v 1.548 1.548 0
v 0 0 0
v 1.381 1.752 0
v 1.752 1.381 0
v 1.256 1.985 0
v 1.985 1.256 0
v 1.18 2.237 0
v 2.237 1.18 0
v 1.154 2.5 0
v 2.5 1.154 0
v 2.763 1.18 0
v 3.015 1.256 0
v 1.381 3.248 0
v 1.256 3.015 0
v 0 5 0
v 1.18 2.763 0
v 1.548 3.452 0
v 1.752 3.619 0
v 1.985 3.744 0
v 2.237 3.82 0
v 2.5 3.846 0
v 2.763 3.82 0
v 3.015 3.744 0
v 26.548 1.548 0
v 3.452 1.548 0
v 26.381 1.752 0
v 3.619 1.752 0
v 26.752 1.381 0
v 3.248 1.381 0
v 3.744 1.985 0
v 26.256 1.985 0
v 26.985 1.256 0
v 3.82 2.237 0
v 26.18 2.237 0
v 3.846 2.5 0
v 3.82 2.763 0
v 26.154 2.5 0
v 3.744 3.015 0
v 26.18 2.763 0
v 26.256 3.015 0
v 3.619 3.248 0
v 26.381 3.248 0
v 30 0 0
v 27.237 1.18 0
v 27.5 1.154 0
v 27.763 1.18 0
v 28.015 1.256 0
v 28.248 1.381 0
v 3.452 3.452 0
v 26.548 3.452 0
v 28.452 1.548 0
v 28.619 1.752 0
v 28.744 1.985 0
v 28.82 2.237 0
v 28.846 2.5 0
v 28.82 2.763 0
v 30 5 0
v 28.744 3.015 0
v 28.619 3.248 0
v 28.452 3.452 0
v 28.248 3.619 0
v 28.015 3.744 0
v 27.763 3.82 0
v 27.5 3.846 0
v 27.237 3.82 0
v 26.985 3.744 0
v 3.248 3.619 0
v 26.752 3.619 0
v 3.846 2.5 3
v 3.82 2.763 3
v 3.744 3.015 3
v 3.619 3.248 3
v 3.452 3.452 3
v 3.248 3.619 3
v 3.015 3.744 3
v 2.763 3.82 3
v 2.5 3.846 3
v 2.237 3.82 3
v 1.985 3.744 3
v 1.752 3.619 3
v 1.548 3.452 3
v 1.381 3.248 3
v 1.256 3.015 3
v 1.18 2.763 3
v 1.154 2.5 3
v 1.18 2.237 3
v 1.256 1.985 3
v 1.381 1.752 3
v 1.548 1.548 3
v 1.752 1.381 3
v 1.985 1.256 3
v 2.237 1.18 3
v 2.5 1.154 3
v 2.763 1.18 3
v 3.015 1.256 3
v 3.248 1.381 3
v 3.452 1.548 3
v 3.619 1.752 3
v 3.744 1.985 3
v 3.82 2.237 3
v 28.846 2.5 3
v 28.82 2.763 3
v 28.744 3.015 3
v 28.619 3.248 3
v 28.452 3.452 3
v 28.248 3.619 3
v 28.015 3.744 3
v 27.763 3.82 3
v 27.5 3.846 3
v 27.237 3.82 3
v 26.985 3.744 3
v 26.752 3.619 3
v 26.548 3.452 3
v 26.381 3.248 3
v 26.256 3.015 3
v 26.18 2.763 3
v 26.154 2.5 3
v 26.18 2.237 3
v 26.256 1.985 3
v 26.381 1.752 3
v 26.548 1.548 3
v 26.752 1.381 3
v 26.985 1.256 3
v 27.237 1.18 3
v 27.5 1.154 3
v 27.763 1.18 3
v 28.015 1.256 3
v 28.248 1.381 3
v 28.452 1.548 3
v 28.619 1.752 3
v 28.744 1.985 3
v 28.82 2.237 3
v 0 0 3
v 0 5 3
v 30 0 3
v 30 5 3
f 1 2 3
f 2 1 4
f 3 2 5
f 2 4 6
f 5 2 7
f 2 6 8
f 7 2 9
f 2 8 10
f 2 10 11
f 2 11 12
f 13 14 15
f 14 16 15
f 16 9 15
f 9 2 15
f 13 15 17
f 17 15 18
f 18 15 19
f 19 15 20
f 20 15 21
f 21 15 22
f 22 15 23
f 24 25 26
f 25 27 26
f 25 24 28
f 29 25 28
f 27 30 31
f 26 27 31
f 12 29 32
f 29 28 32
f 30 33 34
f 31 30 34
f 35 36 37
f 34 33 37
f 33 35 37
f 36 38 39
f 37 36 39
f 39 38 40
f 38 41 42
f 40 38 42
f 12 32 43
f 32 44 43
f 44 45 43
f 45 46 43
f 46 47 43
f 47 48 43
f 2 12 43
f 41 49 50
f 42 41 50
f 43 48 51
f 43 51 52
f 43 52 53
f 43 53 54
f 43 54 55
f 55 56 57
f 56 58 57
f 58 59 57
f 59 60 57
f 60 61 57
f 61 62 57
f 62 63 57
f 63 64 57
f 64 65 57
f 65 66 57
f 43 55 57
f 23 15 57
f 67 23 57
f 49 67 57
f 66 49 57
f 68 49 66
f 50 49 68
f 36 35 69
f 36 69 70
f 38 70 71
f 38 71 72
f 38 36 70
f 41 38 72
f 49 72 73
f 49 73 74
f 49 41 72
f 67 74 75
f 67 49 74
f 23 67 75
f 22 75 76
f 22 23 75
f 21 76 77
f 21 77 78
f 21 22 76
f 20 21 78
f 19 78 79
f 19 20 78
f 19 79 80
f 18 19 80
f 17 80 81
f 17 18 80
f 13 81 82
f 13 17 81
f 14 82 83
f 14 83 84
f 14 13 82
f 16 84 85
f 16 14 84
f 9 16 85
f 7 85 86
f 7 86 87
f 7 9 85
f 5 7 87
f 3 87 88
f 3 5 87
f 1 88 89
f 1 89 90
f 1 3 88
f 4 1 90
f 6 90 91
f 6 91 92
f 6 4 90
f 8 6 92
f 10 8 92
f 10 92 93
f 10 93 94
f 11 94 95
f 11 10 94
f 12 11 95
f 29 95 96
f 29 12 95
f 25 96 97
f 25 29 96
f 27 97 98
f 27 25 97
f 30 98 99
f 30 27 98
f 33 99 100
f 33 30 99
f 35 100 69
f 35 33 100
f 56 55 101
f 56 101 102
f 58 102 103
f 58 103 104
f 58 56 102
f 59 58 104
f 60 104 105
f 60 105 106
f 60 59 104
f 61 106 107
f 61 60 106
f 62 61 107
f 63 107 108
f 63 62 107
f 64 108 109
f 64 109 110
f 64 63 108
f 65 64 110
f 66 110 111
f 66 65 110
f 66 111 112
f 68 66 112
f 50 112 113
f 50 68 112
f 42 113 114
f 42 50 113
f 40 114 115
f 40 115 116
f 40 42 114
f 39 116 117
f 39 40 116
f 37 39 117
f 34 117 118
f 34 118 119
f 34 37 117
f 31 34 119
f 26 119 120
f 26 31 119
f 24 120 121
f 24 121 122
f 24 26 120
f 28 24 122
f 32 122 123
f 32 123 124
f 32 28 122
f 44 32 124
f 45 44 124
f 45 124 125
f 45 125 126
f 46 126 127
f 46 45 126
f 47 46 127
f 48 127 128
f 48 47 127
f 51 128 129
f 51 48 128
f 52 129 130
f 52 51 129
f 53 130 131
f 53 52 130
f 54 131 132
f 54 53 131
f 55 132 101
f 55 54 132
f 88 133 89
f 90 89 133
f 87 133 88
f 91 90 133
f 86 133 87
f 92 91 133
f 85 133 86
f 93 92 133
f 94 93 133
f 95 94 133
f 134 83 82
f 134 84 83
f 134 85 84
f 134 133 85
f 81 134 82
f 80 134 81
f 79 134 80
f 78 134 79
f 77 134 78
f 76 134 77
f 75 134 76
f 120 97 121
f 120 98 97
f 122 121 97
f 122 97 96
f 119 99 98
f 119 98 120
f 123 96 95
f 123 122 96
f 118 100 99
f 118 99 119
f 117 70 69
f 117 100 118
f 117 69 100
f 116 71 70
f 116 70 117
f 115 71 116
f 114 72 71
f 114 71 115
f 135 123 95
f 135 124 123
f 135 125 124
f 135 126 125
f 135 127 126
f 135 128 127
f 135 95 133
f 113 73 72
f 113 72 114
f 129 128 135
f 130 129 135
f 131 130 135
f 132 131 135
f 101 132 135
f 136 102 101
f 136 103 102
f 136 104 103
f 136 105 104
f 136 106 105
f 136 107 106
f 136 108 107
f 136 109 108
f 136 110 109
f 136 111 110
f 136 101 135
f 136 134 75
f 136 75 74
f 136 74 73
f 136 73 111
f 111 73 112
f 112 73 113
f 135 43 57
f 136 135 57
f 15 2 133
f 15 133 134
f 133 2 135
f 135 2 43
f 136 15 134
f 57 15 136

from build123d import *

# Parameters (mm, degrees)
ESQUISSE1_W        = 30
ESQUISSE1_H        = 5
ESQUISSE1_R        = 1.346150104
BOSS_EXTRU_1_DEPTH = 3


with BuildPart() as part:
    # Esquisse1 → Boss.-Extru.1 (new body)
    with BuildSketch(Plane.XY):
        with Locations((15, 2.5)):
            Rectangle(ESQUISSE1_W, ESQUISSE1_H)
        with Locations((2.5, 2.5)):
            Circle(ESQUISSE1_R, mode=Mode.SUBTRACT)
        with Locations((27.5, 2.5)):
            Circle(ESQUISSE1_R, mode=Mode.SUBTRACT)
    extrude(amount=BOSS_EXTRU_1_DEPTH)


solid = part.part
